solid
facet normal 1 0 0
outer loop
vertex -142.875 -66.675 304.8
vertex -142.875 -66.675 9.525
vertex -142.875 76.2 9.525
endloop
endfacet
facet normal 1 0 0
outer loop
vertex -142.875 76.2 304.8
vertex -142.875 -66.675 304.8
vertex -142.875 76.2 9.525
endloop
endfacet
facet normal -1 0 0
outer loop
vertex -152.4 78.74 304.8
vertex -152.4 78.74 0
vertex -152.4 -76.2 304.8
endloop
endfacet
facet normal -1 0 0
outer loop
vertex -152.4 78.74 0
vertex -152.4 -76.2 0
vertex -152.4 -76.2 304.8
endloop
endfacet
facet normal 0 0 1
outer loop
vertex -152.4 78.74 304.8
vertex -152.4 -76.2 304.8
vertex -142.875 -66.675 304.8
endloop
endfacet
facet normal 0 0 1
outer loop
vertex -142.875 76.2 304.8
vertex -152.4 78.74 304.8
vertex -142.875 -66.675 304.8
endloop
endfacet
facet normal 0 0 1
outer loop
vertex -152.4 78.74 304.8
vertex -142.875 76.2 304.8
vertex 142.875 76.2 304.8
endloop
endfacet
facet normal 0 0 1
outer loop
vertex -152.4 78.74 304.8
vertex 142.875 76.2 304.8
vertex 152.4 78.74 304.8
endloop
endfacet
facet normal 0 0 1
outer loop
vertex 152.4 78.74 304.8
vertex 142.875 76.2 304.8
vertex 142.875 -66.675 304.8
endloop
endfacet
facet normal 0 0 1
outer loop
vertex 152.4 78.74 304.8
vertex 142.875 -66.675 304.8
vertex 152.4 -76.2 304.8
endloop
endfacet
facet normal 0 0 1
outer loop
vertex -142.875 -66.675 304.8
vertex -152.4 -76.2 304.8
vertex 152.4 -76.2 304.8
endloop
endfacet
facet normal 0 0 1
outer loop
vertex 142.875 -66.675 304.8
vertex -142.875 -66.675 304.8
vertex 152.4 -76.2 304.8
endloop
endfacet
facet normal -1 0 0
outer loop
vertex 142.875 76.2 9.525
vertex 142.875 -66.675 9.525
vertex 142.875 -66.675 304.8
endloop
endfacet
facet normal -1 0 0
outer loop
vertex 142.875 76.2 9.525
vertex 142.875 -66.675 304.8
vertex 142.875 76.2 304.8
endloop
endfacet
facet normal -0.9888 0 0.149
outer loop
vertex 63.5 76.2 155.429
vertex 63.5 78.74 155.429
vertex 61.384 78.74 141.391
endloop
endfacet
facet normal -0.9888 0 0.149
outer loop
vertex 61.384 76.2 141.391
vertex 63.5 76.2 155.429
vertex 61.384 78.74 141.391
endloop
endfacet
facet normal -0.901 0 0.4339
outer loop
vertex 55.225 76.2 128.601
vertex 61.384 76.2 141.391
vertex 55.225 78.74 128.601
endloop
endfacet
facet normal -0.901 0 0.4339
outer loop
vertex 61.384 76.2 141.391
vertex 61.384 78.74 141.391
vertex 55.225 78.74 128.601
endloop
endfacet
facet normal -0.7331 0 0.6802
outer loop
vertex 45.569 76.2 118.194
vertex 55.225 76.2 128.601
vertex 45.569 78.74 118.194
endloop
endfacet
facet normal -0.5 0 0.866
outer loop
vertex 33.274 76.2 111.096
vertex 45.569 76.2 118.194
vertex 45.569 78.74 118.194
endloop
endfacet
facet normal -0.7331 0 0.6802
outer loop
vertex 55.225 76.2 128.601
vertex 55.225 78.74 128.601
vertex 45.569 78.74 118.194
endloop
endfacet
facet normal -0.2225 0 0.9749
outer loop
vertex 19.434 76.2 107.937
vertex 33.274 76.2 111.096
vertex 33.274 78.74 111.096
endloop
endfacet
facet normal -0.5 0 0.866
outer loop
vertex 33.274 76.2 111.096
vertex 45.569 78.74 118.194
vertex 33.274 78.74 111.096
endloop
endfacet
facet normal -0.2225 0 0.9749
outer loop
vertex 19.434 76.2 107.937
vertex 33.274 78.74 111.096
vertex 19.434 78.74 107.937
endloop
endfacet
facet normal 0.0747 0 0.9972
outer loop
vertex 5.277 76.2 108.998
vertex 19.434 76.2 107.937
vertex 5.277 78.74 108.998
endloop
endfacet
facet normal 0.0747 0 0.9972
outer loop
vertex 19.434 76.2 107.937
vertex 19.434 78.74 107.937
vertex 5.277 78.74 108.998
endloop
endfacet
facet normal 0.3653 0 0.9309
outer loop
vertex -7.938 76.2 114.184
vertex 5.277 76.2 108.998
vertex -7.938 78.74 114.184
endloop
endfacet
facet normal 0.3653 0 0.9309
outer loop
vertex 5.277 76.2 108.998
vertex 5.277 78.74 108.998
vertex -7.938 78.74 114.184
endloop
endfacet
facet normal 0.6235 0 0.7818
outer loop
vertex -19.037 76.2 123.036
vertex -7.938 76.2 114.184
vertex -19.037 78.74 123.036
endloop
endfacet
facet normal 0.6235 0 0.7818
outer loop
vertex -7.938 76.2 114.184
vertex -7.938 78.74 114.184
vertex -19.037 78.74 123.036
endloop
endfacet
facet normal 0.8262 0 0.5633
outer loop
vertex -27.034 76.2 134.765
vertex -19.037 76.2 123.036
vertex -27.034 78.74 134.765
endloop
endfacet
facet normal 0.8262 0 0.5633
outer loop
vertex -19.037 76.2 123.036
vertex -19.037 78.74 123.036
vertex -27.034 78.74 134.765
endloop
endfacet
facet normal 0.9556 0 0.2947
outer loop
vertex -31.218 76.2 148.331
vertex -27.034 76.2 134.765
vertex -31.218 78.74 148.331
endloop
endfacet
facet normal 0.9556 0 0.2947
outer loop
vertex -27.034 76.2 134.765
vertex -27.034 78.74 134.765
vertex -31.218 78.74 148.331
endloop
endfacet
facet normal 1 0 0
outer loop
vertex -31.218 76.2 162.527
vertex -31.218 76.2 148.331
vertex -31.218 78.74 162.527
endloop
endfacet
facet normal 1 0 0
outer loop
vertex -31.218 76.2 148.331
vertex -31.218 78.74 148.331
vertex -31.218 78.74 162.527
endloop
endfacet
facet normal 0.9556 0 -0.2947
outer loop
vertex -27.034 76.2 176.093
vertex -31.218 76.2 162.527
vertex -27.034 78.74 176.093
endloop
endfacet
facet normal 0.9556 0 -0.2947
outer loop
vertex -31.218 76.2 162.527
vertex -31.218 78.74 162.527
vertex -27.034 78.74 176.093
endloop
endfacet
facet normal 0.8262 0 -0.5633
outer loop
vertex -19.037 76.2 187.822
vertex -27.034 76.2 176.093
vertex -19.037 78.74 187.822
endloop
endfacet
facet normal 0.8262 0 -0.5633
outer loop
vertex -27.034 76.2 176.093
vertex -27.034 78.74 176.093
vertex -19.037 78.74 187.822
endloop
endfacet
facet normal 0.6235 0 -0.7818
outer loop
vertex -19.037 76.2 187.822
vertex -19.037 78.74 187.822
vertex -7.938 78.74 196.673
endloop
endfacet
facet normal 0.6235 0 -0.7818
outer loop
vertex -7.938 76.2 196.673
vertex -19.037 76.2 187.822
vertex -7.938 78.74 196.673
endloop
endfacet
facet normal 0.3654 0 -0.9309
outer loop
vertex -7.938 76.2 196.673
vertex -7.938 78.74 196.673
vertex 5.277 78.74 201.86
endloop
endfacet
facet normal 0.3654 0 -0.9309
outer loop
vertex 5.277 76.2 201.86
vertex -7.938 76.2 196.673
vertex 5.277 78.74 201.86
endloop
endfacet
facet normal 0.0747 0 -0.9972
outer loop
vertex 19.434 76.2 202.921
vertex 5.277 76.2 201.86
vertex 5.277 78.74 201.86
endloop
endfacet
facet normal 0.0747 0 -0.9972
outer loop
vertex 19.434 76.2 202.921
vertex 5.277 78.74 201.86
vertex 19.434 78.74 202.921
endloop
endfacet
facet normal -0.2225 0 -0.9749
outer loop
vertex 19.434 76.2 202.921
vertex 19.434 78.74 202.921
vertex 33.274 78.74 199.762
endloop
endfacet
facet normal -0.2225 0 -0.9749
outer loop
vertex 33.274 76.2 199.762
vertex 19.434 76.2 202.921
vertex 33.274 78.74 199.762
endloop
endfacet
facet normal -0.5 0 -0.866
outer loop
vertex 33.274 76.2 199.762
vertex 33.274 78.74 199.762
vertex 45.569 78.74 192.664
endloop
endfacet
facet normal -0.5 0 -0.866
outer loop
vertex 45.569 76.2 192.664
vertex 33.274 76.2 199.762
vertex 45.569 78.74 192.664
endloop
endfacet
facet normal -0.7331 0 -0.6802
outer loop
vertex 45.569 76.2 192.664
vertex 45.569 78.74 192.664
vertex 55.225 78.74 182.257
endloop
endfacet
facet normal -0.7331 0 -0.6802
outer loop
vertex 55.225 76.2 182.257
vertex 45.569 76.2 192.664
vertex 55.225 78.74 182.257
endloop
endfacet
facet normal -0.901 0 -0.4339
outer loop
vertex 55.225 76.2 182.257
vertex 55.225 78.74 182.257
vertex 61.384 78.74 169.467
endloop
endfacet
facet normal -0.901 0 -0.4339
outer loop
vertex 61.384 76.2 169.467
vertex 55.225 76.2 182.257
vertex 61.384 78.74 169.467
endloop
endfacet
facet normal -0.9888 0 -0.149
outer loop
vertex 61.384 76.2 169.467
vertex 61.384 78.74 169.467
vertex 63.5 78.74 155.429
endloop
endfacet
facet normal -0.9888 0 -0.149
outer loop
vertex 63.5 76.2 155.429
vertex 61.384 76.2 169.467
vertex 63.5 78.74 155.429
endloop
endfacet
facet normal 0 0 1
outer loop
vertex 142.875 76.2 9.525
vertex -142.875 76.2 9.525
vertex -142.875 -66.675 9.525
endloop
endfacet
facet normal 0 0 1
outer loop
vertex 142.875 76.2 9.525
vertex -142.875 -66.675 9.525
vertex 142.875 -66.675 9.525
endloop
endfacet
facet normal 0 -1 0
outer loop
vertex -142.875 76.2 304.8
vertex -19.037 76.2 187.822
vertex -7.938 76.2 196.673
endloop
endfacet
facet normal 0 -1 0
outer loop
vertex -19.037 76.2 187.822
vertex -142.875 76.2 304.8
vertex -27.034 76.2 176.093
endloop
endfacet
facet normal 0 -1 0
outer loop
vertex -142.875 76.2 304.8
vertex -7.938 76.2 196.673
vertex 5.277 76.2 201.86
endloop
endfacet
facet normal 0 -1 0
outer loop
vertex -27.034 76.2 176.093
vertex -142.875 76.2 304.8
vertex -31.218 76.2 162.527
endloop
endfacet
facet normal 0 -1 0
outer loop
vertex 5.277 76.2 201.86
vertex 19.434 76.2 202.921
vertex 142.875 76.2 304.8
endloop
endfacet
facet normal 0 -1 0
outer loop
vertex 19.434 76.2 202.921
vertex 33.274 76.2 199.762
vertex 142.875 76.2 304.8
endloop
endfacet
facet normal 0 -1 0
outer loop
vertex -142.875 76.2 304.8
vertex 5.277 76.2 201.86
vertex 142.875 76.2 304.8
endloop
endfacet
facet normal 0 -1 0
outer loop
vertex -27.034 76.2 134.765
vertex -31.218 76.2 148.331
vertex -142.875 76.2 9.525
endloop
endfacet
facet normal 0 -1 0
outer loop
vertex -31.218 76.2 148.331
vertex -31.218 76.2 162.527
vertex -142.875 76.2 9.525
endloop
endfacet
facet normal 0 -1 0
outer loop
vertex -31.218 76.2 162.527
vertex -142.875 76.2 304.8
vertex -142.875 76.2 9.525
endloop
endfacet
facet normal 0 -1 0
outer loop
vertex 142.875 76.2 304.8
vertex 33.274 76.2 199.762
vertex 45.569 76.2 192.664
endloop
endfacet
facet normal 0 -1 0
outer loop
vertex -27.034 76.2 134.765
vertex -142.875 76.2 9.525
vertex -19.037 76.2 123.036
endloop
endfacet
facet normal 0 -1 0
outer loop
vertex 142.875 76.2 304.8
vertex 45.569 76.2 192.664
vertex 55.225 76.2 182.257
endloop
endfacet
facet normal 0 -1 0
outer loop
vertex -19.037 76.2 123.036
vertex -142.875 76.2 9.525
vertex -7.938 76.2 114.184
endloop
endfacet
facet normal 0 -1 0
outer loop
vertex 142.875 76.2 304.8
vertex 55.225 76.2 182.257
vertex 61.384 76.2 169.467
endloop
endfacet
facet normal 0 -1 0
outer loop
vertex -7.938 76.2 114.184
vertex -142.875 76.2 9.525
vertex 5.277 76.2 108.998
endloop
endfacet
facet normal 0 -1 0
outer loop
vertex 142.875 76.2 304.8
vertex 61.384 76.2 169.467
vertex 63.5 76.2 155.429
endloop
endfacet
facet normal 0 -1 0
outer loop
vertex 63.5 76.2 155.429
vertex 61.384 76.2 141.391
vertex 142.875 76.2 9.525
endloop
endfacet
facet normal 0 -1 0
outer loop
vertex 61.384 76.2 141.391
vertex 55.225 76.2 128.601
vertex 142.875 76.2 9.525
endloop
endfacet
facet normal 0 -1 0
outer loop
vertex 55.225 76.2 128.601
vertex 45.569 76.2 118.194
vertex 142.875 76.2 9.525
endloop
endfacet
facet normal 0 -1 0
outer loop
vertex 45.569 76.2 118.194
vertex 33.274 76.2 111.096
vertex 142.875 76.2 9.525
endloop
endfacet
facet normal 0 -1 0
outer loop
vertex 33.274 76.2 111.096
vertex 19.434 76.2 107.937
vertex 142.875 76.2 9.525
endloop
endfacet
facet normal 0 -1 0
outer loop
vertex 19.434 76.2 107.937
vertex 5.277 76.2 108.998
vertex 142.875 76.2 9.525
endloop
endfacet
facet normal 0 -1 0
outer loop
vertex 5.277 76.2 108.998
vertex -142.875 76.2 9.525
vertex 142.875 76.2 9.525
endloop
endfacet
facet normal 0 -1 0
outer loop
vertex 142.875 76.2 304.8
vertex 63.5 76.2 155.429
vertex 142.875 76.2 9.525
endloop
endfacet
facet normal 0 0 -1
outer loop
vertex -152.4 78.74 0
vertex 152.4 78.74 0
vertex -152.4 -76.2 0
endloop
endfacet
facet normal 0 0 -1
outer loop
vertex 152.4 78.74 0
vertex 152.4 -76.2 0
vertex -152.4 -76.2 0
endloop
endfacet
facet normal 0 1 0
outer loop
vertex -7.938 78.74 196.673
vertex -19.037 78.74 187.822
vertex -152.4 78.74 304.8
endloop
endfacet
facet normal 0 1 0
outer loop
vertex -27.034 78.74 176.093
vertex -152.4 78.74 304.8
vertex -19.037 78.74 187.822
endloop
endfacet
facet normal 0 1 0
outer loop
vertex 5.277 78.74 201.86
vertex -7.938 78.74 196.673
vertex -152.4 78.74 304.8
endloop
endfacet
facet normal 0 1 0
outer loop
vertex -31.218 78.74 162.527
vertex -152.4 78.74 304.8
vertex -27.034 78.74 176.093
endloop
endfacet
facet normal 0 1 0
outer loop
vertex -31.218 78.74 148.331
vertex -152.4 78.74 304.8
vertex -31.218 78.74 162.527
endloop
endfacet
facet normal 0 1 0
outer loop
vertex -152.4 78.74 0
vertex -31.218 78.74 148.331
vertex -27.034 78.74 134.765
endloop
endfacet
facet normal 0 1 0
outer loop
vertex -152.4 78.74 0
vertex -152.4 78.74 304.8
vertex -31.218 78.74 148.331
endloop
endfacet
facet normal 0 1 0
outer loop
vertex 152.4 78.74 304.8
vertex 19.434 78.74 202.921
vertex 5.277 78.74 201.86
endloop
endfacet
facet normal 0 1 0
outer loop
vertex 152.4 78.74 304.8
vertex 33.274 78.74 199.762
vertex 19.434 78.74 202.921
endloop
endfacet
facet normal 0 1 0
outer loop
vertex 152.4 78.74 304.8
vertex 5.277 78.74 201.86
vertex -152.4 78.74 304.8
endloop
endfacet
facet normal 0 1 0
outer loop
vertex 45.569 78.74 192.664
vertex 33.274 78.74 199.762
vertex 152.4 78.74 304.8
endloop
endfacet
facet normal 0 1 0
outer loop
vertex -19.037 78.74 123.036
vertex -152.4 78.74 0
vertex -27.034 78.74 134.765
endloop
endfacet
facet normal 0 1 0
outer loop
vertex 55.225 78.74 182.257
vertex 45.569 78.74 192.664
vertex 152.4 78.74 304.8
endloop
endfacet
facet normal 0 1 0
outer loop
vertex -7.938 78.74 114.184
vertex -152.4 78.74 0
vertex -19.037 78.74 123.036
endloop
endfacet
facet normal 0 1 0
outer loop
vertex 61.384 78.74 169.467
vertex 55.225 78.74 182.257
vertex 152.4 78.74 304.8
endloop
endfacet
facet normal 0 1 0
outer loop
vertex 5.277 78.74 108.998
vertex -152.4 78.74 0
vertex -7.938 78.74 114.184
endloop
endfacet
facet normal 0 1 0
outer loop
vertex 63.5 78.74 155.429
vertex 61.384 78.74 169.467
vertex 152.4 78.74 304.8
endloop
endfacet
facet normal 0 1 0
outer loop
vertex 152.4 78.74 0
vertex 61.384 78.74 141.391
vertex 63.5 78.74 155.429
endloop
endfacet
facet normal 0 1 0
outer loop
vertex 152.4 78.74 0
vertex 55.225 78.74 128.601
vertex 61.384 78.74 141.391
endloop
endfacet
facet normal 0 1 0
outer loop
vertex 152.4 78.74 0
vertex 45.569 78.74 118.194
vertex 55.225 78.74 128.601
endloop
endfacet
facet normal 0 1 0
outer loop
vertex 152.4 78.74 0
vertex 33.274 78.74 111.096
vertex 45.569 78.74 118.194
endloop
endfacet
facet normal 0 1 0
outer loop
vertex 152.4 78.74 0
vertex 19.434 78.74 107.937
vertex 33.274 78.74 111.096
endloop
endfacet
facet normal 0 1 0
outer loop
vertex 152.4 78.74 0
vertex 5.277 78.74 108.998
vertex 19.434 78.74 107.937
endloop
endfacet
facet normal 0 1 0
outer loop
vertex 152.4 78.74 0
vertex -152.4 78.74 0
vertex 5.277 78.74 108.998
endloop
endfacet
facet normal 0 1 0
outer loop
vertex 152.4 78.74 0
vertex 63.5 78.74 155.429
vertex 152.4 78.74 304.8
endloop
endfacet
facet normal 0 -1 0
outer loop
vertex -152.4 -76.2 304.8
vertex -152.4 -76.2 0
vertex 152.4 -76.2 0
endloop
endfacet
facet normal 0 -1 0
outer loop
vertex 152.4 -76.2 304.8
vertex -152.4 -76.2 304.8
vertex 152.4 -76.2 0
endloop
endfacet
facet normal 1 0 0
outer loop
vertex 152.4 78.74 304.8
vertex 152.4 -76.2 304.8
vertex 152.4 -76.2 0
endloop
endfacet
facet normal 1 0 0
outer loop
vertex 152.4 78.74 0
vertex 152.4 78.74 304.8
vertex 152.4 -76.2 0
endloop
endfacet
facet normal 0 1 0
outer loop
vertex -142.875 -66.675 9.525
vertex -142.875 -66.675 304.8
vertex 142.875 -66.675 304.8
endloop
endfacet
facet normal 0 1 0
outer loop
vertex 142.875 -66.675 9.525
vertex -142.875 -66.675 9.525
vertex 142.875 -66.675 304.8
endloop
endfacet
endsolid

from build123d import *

# Parameters (mm, degrees)
SKETCH1_W           = 304.8
SKETCH1_H           = 152.4
BOSS_EXTRUDE1_DEPTH = 304.8
SHELL1_T            = -9.525
BOSS_EXTRUDE2_DEPTH = 2.54
SKETCH4_R           = 47.625
CUT_EXTRUDE1_DEPTH  = 7.62


with BuildPart() as part:
    # Sketch1 → Boss-Extrude1 (new body)
    with BuildSketch(Plane.XY):
        Rectangle(SKETCH1_W, SKETCH1_H)
    extrude(amount=BOSS_EXTRUDE1_DEPTH)

    # Shell1
    shell1_openings = [part.faces().sort_by_distance(p)[0] for p in [
        (0, 0, 304.8),
        (0, 76.2, 152.4),
    ]]
    offset(amount=SHELL1_T, openings=shell1_openings, kind=Kind.INTERSECTION)

    # Sketch2 → Boss-Extrude2 (add)
    with BuildSketch(Plane(origin=(0, 76.2, 0), x_dir=(1, 0, 0), z_dir=(0, 1, 0))):
        Polygon((-142.875, -304.8), (142.875, -304.8), (152.4, -304.8), (152.4, 0), (-152.4, 0), (-152.4, -304.8), align=None)
    extrude(amount=BOSS_EXTRUDE2_DEPTH)

    # Sketch4 → Cut-Extrude1 (cut)
    with BuildSketch(Plane(origin=(0, 78.74, 0), x_dir=(1, 0, 0), z_dir=(0, 1, 0))):
        with Locations((15.875, -155.428881859)):
            Circle(SKETCH4_R)
    extrude(amount=-CUT_EXTRUDE1_DEPTH, mode=Mode.SUBTRACT)


solid = part.part
